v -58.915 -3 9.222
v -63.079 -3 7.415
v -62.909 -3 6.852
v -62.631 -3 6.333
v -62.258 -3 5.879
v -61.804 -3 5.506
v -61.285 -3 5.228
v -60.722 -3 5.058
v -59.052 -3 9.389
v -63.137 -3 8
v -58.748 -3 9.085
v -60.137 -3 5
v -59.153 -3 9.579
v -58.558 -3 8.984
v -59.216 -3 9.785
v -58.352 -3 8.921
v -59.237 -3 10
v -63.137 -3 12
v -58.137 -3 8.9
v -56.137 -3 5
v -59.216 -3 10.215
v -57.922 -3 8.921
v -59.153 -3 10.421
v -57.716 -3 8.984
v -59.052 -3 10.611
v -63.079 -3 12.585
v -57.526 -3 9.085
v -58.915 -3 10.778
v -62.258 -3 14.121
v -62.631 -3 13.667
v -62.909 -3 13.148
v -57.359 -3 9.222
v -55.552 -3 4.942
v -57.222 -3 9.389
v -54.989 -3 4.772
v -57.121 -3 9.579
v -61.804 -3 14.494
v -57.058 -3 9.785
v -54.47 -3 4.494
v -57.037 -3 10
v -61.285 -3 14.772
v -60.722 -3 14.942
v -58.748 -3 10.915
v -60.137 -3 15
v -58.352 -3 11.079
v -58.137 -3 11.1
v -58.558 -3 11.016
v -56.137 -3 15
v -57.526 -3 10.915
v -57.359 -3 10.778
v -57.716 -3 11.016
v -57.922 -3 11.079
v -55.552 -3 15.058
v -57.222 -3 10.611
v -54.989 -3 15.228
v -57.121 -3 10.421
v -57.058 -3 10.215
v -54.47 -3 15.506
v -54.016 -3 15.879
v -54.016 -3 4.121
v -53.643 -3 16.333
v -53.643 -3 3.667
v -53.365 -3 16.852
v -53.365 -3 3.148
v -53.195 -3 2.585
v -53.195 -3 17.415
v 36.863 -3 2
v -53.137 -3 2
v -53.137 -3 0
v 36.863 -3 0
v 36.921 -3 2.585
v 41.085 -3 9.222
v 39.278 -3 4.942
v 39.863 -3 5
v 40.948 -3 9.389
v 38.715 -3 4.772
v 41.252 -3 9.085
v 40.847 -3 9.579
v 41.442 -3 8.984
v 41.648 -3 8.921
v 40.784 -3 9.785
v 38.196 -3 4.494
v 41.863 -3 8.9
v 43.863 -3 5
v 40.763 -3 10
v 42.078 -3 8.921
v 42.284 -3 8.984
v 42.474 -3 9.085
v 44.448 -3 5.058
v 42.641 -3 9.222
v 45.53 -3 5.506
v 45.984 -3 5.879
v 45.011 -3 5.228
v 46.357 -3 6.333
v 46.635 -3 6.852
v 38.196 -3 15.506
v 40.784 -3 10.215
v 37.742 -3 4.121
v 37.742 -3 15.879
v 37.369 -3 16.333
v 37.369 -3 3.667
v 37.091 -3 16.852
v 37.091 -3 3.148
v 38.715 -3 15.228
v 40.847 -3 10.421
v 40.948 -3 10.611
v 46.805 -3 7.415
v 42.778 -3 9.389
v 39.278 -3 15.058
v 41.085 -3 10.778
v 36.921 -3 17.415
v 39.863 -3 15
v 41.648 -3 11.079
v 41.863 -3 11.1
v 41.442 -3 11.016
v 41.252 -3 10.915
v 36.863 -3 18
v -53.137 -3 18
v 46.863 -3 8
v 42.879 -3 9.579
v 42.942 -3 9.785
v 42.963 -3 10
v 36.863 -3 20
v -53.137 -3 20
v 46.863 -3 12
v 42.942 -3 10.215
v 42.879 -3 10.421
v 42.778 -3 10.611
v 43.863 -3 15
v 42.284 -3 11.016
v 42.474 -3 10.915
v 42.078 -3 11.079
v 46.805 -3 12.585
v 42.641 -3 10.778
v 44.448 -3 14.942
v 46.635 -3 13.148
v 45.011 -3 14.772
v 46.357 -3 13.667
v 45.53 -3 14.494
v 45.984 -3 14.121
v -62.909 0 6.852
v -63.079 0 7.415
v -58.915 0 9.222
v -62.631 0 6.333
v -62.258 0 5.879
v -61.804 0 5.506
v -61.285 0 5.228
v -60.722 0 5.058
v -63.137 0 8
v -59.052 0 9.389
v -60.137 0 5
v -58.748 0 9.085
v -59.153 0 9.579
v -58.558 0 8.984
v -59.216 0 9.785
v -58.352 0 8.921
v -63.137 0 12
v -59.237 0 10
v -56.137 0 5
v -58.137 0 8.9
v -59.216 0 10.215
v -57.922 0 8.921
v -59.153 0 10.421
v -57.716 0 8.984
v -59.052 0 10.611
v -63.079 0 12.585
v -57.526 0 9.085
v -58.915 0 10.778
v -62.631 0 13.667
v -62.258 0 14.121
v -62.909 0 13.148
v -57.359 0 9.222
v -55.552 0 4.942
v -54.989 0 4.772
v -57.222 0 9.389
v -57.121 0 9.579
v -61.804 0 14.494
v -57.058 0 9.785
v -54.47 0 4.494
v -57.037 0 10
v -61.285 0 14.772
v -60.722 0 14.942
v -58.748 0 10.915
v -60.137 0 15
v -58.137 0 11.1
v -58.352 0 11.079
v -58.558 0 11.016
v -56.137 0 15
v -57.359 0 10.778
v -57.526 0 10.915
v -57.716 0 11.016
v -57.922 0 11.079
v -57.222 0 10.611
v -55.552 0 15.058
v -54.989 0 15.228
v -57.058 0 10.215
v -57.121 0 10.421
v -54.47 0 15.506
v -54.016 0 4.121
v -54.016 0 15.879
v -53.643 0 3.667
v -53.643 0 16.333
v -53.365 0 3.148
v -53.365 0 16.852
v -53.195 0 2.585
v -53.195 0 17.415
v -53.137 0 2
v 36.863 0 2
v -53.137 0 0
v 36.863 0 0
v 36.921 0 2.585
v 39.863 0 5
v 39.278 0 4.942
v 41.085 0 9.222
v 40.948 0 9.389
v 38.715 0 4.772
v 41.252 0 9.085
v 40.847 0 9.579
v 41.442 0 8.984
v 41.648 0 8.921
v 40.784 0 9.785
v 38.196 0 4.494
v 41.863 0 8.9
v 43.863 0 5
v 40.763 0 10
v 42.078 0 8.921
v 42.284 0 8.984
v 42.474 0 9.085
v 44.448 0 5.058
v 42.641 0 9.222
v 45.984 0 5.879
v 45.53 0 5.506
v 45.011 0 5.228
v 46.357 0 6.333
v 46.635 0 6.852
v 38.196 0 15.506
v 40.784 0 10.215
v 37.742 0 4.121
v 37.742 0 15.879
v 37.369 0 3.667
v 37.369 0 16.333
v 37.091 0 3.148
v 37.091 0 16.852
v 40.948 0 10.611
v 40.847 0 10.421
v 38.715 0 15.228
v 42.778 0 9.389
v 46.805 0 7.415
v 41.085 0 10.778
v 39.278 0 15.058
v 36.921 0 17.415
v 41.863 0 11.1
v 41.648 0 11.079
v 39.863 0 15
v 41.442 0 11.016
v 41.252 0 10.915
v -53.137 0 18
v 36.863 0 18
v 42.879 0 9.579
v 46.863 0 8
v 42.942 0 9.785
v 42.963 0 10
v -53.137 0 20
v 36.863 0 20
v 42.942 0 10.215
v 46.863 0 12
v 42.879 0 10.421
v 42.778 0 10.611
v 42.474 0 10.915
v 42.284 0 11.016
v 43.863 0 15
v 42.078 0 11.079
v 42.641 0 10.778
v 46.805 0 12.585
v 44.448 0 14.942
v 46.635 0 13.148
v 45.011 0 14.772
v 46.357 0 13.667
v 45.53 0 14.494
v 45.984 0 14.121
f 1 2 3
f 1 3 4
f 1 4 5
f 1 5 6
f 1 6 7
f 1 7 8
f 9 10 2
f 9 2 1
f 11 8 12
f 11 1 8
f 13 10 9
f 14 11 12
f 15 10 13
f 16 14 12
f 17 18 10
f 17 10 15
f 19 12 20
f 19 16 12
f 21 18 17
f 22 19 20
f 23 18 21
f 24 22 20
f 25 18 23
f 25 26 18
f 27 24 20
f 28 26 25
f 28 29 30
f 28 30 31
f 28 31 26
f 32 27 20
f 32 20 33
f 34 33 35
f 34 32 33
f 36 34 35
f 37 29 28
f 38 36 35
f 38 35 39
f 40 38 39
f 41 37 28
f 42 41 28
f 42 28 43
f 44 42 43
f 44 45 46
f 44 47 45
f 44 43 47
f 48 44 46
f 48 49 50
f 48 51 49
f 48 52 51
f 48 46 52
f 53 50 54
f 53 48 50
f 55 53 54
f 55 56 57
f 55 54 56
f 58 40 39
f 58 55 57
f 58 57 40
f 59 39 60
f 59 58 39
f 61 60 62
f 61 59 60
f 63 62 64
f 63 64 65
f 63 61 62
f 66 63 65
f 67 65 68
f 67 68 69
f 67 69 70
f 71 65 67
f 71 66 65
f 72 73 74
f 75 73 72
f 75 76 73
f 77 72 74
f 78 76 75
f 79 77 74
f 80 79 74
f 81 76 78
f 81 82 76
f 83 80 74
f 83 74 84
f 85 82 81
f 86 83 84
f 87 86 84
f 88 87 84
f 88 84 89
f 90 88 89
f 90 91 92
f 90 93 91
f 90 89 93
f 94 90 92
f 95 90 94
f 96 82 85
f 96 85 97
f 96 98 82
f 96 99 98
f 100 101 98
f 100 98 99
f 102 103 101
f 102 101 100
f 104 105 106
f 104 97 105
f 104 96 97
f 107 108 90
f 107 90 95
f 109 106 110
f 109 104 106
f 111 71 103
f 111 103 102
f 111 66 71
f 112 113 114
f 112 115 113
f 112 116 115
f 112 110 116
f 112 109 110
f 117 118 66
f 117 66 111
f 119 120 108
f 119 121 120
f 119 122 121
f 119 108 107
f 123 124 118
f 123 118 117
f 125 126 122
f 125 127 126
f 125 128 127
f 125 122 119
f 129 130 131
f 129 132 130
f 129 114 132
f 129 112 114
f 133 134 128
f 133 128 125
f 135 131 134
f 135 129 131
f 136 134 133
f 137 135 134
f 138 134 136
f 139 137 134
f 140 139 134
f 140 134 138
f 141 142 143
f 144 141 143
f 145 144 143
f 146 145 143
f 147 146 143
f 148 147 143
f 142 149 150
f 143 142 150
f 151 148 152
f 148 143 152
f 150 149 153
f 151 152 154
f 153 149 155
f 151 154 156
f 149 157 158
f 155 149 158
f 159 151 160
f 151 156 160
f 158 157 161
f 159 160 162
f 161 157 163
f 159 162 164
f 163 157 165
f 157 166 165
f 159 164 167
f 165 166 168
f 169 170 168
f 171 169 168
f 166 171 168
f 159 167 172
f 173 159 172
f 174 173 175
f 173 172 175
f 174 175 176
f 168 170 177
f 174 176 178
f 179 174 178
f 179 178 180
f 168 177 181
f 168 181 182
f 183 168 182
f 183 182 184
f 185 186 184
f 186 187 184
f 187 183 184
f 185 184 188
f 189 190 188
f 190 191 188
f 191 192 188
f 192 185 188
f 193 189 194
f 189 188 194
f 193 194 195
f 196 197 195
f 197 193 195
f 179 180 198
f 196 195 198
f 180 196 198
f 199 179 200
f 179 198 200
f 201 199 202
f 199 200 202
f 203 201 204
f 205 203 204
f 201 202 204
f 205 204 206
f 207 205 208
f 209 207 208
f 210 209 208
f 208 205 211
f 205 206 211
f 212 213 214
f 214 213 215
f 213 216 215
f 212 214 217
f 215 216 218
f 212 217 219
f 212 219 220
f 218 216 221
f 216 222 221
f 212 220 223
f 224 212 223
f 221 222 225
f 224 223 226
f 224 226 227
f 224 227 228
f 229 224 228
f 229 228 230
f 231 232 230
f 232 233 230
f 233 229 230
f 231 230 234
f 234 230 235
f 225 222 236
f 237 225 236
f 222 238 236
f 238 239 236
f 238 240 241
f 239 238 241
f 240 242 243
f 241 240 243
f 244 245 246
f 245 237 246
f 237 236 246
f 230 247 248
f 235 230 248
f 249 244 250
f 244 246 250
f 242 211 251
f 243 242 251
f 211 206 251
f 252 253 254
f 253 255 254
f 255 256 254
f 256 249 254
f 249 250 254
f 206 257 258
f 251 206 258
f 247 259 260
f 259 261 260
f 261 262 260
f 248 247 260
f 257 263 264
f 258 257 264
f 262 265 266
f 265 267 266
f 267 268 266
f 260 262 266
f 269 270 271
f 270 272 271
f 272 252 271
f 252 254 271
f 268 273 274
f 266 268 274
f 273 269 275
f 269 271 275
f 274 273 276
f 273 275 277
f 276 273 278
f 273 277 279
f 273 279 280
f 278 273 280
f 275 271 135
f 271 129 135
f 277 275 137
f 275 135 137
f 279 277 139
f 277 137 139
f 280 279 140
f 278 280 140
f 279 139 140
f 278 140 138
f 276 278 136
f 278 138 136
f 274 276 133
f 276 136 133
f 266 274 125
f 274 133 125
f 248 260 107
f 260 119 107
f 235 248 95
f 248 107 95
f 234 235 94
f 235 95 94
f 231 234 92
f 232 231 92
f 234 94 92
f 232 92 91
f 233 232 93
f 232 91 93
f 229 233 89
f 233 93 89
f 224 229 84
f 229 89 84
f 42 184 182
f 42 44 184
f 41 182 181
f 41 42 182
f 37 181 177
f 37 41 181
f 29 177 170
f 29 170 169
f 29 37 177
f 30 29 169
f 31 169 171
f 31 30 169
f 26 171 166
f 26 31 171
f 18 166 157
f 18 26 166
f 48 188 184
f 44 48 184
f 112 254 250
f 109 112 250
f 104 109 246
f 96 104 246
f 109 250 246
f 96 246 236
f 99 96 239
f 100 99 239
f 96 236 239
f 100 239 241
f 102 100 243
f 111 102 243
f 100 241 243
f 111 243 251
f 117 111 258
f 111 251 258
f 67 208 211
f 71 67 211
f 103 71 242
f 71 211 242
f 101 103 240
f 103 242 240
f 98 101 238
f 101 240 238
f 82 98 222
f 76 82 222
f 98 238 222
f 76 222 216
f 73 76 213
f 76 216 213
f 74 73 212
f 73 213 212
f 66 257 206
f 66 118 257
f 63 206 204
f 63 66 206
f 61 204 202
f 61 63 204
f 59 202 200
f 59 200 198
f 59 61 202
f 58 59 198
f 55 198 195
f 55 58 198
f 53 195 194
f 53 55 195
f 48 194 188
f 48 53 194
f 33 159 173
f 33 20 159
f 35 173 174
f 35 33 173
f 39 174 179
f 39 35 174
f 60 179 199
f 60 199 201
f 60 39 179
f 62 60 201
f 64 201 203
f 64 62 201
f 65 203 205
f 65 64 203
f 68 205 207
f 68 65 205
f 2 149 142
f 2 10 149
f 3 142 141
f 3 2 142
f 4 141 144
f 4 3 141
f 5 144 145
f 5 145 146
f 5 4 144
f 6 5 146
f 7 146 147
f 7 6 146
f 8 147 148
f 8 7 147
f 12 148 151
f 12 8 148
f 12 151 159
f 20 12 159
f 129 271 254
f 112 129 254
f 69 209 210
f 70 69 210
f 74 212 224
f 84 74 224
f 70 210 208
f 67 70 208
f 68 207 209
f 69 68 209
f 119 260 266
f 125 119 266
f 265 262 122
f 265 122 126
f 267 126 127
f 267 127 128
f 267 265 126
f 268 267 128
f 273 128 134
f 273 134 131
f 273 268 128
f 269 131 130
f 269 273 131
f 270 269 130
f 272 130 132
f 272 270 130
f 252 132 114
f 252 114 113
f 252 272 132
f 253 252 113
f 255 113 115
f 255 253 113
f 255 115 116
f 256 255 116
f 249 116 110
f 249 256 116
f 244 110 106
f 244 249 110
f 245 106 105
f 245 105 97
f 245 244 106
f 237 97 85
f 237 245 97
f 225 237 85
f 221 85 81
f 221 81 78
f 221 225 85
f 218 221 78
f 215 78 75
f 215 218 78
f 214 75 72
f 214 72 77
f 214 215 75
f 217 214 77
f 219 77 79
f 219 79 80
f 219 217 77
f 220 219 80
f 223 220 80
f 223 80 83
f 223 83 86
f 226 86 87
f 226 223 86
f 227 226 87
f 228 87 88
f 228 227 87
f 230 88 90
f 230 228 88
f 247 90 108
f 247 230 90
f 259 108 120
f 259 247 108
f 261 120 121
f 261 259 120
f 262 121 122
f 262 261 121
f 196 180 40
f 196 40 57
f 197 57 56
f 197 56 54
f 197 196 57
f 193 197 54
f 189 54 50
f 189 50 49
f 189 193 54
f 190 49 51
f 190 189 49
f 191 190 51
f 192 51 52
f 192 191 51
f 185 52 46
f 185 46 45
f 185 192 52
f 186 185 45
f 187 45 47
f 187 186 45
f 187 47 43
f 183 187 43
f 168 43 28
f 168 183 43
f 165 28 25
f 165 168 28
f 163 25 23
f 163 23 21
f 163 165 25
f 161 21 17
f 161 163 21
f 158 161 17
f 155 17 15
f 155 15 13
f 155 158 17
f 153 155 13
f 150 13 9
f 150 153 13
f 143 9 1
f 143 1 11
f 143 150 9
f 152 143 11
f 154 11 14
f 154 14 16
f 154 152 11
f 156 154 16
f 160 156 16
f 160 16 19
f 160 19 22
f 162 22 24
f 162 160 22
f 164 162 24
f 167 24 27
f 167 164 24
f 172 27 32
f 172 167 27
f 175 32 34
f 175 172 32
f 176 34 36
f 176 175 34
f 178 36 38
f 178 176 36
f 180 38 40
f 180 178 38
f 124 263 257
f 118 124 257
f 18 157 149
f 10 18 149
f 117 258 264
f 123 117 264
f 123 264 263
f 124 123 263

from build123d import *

# Parameters (mm, degrees)
F0_R     = 1.1
F1_DEPTH = 3
F2_R     = 3


with BuildPart() as f1:
    # F0 (on Front) → F1 (new body)
    with BuildSketch(Plane.XZ):
        with BuildLine():
            Line((36.86291, 20), (-53.13709, 20))
            Line((-53.13709, 20), (-53.13709, 15))
            Line((-53.13709, 15), (-63.13709, 15))
            Line((-63.13709, 15), (-63.13709, 5))
            Line((-63.13709, 5), (-53.13709, 5))
            Line((-53.13709, 5), (-53.13709, 0))
            Line((-53.13709, 0), (36.86291, 0))
            Line((36.86291, 0), (36.86291, 2))
            ThreePointArc((36.86291, 2), (37.74159, 4.12132), (39.86291, 5))
            Line((39.86291, 5), (46.86291, 5))
            Line((46.86291, 5), (46.86291, 15))
            Line((46.86291, 15), (39.86291, 15))
            ThreePointArc((39.86291, 15), (37.74159, 15.87868), (36.86291, 18))
            Line((36.86291, 18), (36.86291, 20))
        make_face()
        with Locations((-58.13709, 10)):
            Circle(F0_R, mode=Mode.SUBTRACT)
        with Locations((41.86291, 10)):
            Circle(F0_R, mode=Mode.SUBTRACT)
    extrude(amount=F1_DEPTH)

    # F2
    f2_edges = [f1.edges().sort_by_distance(p)[0] for p in [
        (-53.13709, -1.5, 15),
        (-53.13709, -1.5, 5),
        (-63.13709, -1.5, 15),
        (-63.13709, -1.5, 5),
        (46.86291, -1.5, 5),
        (46.86291, -1.5, 15),
    ]]
    fillet(f2_edges, radius=F2_R)


solid = f1.part
